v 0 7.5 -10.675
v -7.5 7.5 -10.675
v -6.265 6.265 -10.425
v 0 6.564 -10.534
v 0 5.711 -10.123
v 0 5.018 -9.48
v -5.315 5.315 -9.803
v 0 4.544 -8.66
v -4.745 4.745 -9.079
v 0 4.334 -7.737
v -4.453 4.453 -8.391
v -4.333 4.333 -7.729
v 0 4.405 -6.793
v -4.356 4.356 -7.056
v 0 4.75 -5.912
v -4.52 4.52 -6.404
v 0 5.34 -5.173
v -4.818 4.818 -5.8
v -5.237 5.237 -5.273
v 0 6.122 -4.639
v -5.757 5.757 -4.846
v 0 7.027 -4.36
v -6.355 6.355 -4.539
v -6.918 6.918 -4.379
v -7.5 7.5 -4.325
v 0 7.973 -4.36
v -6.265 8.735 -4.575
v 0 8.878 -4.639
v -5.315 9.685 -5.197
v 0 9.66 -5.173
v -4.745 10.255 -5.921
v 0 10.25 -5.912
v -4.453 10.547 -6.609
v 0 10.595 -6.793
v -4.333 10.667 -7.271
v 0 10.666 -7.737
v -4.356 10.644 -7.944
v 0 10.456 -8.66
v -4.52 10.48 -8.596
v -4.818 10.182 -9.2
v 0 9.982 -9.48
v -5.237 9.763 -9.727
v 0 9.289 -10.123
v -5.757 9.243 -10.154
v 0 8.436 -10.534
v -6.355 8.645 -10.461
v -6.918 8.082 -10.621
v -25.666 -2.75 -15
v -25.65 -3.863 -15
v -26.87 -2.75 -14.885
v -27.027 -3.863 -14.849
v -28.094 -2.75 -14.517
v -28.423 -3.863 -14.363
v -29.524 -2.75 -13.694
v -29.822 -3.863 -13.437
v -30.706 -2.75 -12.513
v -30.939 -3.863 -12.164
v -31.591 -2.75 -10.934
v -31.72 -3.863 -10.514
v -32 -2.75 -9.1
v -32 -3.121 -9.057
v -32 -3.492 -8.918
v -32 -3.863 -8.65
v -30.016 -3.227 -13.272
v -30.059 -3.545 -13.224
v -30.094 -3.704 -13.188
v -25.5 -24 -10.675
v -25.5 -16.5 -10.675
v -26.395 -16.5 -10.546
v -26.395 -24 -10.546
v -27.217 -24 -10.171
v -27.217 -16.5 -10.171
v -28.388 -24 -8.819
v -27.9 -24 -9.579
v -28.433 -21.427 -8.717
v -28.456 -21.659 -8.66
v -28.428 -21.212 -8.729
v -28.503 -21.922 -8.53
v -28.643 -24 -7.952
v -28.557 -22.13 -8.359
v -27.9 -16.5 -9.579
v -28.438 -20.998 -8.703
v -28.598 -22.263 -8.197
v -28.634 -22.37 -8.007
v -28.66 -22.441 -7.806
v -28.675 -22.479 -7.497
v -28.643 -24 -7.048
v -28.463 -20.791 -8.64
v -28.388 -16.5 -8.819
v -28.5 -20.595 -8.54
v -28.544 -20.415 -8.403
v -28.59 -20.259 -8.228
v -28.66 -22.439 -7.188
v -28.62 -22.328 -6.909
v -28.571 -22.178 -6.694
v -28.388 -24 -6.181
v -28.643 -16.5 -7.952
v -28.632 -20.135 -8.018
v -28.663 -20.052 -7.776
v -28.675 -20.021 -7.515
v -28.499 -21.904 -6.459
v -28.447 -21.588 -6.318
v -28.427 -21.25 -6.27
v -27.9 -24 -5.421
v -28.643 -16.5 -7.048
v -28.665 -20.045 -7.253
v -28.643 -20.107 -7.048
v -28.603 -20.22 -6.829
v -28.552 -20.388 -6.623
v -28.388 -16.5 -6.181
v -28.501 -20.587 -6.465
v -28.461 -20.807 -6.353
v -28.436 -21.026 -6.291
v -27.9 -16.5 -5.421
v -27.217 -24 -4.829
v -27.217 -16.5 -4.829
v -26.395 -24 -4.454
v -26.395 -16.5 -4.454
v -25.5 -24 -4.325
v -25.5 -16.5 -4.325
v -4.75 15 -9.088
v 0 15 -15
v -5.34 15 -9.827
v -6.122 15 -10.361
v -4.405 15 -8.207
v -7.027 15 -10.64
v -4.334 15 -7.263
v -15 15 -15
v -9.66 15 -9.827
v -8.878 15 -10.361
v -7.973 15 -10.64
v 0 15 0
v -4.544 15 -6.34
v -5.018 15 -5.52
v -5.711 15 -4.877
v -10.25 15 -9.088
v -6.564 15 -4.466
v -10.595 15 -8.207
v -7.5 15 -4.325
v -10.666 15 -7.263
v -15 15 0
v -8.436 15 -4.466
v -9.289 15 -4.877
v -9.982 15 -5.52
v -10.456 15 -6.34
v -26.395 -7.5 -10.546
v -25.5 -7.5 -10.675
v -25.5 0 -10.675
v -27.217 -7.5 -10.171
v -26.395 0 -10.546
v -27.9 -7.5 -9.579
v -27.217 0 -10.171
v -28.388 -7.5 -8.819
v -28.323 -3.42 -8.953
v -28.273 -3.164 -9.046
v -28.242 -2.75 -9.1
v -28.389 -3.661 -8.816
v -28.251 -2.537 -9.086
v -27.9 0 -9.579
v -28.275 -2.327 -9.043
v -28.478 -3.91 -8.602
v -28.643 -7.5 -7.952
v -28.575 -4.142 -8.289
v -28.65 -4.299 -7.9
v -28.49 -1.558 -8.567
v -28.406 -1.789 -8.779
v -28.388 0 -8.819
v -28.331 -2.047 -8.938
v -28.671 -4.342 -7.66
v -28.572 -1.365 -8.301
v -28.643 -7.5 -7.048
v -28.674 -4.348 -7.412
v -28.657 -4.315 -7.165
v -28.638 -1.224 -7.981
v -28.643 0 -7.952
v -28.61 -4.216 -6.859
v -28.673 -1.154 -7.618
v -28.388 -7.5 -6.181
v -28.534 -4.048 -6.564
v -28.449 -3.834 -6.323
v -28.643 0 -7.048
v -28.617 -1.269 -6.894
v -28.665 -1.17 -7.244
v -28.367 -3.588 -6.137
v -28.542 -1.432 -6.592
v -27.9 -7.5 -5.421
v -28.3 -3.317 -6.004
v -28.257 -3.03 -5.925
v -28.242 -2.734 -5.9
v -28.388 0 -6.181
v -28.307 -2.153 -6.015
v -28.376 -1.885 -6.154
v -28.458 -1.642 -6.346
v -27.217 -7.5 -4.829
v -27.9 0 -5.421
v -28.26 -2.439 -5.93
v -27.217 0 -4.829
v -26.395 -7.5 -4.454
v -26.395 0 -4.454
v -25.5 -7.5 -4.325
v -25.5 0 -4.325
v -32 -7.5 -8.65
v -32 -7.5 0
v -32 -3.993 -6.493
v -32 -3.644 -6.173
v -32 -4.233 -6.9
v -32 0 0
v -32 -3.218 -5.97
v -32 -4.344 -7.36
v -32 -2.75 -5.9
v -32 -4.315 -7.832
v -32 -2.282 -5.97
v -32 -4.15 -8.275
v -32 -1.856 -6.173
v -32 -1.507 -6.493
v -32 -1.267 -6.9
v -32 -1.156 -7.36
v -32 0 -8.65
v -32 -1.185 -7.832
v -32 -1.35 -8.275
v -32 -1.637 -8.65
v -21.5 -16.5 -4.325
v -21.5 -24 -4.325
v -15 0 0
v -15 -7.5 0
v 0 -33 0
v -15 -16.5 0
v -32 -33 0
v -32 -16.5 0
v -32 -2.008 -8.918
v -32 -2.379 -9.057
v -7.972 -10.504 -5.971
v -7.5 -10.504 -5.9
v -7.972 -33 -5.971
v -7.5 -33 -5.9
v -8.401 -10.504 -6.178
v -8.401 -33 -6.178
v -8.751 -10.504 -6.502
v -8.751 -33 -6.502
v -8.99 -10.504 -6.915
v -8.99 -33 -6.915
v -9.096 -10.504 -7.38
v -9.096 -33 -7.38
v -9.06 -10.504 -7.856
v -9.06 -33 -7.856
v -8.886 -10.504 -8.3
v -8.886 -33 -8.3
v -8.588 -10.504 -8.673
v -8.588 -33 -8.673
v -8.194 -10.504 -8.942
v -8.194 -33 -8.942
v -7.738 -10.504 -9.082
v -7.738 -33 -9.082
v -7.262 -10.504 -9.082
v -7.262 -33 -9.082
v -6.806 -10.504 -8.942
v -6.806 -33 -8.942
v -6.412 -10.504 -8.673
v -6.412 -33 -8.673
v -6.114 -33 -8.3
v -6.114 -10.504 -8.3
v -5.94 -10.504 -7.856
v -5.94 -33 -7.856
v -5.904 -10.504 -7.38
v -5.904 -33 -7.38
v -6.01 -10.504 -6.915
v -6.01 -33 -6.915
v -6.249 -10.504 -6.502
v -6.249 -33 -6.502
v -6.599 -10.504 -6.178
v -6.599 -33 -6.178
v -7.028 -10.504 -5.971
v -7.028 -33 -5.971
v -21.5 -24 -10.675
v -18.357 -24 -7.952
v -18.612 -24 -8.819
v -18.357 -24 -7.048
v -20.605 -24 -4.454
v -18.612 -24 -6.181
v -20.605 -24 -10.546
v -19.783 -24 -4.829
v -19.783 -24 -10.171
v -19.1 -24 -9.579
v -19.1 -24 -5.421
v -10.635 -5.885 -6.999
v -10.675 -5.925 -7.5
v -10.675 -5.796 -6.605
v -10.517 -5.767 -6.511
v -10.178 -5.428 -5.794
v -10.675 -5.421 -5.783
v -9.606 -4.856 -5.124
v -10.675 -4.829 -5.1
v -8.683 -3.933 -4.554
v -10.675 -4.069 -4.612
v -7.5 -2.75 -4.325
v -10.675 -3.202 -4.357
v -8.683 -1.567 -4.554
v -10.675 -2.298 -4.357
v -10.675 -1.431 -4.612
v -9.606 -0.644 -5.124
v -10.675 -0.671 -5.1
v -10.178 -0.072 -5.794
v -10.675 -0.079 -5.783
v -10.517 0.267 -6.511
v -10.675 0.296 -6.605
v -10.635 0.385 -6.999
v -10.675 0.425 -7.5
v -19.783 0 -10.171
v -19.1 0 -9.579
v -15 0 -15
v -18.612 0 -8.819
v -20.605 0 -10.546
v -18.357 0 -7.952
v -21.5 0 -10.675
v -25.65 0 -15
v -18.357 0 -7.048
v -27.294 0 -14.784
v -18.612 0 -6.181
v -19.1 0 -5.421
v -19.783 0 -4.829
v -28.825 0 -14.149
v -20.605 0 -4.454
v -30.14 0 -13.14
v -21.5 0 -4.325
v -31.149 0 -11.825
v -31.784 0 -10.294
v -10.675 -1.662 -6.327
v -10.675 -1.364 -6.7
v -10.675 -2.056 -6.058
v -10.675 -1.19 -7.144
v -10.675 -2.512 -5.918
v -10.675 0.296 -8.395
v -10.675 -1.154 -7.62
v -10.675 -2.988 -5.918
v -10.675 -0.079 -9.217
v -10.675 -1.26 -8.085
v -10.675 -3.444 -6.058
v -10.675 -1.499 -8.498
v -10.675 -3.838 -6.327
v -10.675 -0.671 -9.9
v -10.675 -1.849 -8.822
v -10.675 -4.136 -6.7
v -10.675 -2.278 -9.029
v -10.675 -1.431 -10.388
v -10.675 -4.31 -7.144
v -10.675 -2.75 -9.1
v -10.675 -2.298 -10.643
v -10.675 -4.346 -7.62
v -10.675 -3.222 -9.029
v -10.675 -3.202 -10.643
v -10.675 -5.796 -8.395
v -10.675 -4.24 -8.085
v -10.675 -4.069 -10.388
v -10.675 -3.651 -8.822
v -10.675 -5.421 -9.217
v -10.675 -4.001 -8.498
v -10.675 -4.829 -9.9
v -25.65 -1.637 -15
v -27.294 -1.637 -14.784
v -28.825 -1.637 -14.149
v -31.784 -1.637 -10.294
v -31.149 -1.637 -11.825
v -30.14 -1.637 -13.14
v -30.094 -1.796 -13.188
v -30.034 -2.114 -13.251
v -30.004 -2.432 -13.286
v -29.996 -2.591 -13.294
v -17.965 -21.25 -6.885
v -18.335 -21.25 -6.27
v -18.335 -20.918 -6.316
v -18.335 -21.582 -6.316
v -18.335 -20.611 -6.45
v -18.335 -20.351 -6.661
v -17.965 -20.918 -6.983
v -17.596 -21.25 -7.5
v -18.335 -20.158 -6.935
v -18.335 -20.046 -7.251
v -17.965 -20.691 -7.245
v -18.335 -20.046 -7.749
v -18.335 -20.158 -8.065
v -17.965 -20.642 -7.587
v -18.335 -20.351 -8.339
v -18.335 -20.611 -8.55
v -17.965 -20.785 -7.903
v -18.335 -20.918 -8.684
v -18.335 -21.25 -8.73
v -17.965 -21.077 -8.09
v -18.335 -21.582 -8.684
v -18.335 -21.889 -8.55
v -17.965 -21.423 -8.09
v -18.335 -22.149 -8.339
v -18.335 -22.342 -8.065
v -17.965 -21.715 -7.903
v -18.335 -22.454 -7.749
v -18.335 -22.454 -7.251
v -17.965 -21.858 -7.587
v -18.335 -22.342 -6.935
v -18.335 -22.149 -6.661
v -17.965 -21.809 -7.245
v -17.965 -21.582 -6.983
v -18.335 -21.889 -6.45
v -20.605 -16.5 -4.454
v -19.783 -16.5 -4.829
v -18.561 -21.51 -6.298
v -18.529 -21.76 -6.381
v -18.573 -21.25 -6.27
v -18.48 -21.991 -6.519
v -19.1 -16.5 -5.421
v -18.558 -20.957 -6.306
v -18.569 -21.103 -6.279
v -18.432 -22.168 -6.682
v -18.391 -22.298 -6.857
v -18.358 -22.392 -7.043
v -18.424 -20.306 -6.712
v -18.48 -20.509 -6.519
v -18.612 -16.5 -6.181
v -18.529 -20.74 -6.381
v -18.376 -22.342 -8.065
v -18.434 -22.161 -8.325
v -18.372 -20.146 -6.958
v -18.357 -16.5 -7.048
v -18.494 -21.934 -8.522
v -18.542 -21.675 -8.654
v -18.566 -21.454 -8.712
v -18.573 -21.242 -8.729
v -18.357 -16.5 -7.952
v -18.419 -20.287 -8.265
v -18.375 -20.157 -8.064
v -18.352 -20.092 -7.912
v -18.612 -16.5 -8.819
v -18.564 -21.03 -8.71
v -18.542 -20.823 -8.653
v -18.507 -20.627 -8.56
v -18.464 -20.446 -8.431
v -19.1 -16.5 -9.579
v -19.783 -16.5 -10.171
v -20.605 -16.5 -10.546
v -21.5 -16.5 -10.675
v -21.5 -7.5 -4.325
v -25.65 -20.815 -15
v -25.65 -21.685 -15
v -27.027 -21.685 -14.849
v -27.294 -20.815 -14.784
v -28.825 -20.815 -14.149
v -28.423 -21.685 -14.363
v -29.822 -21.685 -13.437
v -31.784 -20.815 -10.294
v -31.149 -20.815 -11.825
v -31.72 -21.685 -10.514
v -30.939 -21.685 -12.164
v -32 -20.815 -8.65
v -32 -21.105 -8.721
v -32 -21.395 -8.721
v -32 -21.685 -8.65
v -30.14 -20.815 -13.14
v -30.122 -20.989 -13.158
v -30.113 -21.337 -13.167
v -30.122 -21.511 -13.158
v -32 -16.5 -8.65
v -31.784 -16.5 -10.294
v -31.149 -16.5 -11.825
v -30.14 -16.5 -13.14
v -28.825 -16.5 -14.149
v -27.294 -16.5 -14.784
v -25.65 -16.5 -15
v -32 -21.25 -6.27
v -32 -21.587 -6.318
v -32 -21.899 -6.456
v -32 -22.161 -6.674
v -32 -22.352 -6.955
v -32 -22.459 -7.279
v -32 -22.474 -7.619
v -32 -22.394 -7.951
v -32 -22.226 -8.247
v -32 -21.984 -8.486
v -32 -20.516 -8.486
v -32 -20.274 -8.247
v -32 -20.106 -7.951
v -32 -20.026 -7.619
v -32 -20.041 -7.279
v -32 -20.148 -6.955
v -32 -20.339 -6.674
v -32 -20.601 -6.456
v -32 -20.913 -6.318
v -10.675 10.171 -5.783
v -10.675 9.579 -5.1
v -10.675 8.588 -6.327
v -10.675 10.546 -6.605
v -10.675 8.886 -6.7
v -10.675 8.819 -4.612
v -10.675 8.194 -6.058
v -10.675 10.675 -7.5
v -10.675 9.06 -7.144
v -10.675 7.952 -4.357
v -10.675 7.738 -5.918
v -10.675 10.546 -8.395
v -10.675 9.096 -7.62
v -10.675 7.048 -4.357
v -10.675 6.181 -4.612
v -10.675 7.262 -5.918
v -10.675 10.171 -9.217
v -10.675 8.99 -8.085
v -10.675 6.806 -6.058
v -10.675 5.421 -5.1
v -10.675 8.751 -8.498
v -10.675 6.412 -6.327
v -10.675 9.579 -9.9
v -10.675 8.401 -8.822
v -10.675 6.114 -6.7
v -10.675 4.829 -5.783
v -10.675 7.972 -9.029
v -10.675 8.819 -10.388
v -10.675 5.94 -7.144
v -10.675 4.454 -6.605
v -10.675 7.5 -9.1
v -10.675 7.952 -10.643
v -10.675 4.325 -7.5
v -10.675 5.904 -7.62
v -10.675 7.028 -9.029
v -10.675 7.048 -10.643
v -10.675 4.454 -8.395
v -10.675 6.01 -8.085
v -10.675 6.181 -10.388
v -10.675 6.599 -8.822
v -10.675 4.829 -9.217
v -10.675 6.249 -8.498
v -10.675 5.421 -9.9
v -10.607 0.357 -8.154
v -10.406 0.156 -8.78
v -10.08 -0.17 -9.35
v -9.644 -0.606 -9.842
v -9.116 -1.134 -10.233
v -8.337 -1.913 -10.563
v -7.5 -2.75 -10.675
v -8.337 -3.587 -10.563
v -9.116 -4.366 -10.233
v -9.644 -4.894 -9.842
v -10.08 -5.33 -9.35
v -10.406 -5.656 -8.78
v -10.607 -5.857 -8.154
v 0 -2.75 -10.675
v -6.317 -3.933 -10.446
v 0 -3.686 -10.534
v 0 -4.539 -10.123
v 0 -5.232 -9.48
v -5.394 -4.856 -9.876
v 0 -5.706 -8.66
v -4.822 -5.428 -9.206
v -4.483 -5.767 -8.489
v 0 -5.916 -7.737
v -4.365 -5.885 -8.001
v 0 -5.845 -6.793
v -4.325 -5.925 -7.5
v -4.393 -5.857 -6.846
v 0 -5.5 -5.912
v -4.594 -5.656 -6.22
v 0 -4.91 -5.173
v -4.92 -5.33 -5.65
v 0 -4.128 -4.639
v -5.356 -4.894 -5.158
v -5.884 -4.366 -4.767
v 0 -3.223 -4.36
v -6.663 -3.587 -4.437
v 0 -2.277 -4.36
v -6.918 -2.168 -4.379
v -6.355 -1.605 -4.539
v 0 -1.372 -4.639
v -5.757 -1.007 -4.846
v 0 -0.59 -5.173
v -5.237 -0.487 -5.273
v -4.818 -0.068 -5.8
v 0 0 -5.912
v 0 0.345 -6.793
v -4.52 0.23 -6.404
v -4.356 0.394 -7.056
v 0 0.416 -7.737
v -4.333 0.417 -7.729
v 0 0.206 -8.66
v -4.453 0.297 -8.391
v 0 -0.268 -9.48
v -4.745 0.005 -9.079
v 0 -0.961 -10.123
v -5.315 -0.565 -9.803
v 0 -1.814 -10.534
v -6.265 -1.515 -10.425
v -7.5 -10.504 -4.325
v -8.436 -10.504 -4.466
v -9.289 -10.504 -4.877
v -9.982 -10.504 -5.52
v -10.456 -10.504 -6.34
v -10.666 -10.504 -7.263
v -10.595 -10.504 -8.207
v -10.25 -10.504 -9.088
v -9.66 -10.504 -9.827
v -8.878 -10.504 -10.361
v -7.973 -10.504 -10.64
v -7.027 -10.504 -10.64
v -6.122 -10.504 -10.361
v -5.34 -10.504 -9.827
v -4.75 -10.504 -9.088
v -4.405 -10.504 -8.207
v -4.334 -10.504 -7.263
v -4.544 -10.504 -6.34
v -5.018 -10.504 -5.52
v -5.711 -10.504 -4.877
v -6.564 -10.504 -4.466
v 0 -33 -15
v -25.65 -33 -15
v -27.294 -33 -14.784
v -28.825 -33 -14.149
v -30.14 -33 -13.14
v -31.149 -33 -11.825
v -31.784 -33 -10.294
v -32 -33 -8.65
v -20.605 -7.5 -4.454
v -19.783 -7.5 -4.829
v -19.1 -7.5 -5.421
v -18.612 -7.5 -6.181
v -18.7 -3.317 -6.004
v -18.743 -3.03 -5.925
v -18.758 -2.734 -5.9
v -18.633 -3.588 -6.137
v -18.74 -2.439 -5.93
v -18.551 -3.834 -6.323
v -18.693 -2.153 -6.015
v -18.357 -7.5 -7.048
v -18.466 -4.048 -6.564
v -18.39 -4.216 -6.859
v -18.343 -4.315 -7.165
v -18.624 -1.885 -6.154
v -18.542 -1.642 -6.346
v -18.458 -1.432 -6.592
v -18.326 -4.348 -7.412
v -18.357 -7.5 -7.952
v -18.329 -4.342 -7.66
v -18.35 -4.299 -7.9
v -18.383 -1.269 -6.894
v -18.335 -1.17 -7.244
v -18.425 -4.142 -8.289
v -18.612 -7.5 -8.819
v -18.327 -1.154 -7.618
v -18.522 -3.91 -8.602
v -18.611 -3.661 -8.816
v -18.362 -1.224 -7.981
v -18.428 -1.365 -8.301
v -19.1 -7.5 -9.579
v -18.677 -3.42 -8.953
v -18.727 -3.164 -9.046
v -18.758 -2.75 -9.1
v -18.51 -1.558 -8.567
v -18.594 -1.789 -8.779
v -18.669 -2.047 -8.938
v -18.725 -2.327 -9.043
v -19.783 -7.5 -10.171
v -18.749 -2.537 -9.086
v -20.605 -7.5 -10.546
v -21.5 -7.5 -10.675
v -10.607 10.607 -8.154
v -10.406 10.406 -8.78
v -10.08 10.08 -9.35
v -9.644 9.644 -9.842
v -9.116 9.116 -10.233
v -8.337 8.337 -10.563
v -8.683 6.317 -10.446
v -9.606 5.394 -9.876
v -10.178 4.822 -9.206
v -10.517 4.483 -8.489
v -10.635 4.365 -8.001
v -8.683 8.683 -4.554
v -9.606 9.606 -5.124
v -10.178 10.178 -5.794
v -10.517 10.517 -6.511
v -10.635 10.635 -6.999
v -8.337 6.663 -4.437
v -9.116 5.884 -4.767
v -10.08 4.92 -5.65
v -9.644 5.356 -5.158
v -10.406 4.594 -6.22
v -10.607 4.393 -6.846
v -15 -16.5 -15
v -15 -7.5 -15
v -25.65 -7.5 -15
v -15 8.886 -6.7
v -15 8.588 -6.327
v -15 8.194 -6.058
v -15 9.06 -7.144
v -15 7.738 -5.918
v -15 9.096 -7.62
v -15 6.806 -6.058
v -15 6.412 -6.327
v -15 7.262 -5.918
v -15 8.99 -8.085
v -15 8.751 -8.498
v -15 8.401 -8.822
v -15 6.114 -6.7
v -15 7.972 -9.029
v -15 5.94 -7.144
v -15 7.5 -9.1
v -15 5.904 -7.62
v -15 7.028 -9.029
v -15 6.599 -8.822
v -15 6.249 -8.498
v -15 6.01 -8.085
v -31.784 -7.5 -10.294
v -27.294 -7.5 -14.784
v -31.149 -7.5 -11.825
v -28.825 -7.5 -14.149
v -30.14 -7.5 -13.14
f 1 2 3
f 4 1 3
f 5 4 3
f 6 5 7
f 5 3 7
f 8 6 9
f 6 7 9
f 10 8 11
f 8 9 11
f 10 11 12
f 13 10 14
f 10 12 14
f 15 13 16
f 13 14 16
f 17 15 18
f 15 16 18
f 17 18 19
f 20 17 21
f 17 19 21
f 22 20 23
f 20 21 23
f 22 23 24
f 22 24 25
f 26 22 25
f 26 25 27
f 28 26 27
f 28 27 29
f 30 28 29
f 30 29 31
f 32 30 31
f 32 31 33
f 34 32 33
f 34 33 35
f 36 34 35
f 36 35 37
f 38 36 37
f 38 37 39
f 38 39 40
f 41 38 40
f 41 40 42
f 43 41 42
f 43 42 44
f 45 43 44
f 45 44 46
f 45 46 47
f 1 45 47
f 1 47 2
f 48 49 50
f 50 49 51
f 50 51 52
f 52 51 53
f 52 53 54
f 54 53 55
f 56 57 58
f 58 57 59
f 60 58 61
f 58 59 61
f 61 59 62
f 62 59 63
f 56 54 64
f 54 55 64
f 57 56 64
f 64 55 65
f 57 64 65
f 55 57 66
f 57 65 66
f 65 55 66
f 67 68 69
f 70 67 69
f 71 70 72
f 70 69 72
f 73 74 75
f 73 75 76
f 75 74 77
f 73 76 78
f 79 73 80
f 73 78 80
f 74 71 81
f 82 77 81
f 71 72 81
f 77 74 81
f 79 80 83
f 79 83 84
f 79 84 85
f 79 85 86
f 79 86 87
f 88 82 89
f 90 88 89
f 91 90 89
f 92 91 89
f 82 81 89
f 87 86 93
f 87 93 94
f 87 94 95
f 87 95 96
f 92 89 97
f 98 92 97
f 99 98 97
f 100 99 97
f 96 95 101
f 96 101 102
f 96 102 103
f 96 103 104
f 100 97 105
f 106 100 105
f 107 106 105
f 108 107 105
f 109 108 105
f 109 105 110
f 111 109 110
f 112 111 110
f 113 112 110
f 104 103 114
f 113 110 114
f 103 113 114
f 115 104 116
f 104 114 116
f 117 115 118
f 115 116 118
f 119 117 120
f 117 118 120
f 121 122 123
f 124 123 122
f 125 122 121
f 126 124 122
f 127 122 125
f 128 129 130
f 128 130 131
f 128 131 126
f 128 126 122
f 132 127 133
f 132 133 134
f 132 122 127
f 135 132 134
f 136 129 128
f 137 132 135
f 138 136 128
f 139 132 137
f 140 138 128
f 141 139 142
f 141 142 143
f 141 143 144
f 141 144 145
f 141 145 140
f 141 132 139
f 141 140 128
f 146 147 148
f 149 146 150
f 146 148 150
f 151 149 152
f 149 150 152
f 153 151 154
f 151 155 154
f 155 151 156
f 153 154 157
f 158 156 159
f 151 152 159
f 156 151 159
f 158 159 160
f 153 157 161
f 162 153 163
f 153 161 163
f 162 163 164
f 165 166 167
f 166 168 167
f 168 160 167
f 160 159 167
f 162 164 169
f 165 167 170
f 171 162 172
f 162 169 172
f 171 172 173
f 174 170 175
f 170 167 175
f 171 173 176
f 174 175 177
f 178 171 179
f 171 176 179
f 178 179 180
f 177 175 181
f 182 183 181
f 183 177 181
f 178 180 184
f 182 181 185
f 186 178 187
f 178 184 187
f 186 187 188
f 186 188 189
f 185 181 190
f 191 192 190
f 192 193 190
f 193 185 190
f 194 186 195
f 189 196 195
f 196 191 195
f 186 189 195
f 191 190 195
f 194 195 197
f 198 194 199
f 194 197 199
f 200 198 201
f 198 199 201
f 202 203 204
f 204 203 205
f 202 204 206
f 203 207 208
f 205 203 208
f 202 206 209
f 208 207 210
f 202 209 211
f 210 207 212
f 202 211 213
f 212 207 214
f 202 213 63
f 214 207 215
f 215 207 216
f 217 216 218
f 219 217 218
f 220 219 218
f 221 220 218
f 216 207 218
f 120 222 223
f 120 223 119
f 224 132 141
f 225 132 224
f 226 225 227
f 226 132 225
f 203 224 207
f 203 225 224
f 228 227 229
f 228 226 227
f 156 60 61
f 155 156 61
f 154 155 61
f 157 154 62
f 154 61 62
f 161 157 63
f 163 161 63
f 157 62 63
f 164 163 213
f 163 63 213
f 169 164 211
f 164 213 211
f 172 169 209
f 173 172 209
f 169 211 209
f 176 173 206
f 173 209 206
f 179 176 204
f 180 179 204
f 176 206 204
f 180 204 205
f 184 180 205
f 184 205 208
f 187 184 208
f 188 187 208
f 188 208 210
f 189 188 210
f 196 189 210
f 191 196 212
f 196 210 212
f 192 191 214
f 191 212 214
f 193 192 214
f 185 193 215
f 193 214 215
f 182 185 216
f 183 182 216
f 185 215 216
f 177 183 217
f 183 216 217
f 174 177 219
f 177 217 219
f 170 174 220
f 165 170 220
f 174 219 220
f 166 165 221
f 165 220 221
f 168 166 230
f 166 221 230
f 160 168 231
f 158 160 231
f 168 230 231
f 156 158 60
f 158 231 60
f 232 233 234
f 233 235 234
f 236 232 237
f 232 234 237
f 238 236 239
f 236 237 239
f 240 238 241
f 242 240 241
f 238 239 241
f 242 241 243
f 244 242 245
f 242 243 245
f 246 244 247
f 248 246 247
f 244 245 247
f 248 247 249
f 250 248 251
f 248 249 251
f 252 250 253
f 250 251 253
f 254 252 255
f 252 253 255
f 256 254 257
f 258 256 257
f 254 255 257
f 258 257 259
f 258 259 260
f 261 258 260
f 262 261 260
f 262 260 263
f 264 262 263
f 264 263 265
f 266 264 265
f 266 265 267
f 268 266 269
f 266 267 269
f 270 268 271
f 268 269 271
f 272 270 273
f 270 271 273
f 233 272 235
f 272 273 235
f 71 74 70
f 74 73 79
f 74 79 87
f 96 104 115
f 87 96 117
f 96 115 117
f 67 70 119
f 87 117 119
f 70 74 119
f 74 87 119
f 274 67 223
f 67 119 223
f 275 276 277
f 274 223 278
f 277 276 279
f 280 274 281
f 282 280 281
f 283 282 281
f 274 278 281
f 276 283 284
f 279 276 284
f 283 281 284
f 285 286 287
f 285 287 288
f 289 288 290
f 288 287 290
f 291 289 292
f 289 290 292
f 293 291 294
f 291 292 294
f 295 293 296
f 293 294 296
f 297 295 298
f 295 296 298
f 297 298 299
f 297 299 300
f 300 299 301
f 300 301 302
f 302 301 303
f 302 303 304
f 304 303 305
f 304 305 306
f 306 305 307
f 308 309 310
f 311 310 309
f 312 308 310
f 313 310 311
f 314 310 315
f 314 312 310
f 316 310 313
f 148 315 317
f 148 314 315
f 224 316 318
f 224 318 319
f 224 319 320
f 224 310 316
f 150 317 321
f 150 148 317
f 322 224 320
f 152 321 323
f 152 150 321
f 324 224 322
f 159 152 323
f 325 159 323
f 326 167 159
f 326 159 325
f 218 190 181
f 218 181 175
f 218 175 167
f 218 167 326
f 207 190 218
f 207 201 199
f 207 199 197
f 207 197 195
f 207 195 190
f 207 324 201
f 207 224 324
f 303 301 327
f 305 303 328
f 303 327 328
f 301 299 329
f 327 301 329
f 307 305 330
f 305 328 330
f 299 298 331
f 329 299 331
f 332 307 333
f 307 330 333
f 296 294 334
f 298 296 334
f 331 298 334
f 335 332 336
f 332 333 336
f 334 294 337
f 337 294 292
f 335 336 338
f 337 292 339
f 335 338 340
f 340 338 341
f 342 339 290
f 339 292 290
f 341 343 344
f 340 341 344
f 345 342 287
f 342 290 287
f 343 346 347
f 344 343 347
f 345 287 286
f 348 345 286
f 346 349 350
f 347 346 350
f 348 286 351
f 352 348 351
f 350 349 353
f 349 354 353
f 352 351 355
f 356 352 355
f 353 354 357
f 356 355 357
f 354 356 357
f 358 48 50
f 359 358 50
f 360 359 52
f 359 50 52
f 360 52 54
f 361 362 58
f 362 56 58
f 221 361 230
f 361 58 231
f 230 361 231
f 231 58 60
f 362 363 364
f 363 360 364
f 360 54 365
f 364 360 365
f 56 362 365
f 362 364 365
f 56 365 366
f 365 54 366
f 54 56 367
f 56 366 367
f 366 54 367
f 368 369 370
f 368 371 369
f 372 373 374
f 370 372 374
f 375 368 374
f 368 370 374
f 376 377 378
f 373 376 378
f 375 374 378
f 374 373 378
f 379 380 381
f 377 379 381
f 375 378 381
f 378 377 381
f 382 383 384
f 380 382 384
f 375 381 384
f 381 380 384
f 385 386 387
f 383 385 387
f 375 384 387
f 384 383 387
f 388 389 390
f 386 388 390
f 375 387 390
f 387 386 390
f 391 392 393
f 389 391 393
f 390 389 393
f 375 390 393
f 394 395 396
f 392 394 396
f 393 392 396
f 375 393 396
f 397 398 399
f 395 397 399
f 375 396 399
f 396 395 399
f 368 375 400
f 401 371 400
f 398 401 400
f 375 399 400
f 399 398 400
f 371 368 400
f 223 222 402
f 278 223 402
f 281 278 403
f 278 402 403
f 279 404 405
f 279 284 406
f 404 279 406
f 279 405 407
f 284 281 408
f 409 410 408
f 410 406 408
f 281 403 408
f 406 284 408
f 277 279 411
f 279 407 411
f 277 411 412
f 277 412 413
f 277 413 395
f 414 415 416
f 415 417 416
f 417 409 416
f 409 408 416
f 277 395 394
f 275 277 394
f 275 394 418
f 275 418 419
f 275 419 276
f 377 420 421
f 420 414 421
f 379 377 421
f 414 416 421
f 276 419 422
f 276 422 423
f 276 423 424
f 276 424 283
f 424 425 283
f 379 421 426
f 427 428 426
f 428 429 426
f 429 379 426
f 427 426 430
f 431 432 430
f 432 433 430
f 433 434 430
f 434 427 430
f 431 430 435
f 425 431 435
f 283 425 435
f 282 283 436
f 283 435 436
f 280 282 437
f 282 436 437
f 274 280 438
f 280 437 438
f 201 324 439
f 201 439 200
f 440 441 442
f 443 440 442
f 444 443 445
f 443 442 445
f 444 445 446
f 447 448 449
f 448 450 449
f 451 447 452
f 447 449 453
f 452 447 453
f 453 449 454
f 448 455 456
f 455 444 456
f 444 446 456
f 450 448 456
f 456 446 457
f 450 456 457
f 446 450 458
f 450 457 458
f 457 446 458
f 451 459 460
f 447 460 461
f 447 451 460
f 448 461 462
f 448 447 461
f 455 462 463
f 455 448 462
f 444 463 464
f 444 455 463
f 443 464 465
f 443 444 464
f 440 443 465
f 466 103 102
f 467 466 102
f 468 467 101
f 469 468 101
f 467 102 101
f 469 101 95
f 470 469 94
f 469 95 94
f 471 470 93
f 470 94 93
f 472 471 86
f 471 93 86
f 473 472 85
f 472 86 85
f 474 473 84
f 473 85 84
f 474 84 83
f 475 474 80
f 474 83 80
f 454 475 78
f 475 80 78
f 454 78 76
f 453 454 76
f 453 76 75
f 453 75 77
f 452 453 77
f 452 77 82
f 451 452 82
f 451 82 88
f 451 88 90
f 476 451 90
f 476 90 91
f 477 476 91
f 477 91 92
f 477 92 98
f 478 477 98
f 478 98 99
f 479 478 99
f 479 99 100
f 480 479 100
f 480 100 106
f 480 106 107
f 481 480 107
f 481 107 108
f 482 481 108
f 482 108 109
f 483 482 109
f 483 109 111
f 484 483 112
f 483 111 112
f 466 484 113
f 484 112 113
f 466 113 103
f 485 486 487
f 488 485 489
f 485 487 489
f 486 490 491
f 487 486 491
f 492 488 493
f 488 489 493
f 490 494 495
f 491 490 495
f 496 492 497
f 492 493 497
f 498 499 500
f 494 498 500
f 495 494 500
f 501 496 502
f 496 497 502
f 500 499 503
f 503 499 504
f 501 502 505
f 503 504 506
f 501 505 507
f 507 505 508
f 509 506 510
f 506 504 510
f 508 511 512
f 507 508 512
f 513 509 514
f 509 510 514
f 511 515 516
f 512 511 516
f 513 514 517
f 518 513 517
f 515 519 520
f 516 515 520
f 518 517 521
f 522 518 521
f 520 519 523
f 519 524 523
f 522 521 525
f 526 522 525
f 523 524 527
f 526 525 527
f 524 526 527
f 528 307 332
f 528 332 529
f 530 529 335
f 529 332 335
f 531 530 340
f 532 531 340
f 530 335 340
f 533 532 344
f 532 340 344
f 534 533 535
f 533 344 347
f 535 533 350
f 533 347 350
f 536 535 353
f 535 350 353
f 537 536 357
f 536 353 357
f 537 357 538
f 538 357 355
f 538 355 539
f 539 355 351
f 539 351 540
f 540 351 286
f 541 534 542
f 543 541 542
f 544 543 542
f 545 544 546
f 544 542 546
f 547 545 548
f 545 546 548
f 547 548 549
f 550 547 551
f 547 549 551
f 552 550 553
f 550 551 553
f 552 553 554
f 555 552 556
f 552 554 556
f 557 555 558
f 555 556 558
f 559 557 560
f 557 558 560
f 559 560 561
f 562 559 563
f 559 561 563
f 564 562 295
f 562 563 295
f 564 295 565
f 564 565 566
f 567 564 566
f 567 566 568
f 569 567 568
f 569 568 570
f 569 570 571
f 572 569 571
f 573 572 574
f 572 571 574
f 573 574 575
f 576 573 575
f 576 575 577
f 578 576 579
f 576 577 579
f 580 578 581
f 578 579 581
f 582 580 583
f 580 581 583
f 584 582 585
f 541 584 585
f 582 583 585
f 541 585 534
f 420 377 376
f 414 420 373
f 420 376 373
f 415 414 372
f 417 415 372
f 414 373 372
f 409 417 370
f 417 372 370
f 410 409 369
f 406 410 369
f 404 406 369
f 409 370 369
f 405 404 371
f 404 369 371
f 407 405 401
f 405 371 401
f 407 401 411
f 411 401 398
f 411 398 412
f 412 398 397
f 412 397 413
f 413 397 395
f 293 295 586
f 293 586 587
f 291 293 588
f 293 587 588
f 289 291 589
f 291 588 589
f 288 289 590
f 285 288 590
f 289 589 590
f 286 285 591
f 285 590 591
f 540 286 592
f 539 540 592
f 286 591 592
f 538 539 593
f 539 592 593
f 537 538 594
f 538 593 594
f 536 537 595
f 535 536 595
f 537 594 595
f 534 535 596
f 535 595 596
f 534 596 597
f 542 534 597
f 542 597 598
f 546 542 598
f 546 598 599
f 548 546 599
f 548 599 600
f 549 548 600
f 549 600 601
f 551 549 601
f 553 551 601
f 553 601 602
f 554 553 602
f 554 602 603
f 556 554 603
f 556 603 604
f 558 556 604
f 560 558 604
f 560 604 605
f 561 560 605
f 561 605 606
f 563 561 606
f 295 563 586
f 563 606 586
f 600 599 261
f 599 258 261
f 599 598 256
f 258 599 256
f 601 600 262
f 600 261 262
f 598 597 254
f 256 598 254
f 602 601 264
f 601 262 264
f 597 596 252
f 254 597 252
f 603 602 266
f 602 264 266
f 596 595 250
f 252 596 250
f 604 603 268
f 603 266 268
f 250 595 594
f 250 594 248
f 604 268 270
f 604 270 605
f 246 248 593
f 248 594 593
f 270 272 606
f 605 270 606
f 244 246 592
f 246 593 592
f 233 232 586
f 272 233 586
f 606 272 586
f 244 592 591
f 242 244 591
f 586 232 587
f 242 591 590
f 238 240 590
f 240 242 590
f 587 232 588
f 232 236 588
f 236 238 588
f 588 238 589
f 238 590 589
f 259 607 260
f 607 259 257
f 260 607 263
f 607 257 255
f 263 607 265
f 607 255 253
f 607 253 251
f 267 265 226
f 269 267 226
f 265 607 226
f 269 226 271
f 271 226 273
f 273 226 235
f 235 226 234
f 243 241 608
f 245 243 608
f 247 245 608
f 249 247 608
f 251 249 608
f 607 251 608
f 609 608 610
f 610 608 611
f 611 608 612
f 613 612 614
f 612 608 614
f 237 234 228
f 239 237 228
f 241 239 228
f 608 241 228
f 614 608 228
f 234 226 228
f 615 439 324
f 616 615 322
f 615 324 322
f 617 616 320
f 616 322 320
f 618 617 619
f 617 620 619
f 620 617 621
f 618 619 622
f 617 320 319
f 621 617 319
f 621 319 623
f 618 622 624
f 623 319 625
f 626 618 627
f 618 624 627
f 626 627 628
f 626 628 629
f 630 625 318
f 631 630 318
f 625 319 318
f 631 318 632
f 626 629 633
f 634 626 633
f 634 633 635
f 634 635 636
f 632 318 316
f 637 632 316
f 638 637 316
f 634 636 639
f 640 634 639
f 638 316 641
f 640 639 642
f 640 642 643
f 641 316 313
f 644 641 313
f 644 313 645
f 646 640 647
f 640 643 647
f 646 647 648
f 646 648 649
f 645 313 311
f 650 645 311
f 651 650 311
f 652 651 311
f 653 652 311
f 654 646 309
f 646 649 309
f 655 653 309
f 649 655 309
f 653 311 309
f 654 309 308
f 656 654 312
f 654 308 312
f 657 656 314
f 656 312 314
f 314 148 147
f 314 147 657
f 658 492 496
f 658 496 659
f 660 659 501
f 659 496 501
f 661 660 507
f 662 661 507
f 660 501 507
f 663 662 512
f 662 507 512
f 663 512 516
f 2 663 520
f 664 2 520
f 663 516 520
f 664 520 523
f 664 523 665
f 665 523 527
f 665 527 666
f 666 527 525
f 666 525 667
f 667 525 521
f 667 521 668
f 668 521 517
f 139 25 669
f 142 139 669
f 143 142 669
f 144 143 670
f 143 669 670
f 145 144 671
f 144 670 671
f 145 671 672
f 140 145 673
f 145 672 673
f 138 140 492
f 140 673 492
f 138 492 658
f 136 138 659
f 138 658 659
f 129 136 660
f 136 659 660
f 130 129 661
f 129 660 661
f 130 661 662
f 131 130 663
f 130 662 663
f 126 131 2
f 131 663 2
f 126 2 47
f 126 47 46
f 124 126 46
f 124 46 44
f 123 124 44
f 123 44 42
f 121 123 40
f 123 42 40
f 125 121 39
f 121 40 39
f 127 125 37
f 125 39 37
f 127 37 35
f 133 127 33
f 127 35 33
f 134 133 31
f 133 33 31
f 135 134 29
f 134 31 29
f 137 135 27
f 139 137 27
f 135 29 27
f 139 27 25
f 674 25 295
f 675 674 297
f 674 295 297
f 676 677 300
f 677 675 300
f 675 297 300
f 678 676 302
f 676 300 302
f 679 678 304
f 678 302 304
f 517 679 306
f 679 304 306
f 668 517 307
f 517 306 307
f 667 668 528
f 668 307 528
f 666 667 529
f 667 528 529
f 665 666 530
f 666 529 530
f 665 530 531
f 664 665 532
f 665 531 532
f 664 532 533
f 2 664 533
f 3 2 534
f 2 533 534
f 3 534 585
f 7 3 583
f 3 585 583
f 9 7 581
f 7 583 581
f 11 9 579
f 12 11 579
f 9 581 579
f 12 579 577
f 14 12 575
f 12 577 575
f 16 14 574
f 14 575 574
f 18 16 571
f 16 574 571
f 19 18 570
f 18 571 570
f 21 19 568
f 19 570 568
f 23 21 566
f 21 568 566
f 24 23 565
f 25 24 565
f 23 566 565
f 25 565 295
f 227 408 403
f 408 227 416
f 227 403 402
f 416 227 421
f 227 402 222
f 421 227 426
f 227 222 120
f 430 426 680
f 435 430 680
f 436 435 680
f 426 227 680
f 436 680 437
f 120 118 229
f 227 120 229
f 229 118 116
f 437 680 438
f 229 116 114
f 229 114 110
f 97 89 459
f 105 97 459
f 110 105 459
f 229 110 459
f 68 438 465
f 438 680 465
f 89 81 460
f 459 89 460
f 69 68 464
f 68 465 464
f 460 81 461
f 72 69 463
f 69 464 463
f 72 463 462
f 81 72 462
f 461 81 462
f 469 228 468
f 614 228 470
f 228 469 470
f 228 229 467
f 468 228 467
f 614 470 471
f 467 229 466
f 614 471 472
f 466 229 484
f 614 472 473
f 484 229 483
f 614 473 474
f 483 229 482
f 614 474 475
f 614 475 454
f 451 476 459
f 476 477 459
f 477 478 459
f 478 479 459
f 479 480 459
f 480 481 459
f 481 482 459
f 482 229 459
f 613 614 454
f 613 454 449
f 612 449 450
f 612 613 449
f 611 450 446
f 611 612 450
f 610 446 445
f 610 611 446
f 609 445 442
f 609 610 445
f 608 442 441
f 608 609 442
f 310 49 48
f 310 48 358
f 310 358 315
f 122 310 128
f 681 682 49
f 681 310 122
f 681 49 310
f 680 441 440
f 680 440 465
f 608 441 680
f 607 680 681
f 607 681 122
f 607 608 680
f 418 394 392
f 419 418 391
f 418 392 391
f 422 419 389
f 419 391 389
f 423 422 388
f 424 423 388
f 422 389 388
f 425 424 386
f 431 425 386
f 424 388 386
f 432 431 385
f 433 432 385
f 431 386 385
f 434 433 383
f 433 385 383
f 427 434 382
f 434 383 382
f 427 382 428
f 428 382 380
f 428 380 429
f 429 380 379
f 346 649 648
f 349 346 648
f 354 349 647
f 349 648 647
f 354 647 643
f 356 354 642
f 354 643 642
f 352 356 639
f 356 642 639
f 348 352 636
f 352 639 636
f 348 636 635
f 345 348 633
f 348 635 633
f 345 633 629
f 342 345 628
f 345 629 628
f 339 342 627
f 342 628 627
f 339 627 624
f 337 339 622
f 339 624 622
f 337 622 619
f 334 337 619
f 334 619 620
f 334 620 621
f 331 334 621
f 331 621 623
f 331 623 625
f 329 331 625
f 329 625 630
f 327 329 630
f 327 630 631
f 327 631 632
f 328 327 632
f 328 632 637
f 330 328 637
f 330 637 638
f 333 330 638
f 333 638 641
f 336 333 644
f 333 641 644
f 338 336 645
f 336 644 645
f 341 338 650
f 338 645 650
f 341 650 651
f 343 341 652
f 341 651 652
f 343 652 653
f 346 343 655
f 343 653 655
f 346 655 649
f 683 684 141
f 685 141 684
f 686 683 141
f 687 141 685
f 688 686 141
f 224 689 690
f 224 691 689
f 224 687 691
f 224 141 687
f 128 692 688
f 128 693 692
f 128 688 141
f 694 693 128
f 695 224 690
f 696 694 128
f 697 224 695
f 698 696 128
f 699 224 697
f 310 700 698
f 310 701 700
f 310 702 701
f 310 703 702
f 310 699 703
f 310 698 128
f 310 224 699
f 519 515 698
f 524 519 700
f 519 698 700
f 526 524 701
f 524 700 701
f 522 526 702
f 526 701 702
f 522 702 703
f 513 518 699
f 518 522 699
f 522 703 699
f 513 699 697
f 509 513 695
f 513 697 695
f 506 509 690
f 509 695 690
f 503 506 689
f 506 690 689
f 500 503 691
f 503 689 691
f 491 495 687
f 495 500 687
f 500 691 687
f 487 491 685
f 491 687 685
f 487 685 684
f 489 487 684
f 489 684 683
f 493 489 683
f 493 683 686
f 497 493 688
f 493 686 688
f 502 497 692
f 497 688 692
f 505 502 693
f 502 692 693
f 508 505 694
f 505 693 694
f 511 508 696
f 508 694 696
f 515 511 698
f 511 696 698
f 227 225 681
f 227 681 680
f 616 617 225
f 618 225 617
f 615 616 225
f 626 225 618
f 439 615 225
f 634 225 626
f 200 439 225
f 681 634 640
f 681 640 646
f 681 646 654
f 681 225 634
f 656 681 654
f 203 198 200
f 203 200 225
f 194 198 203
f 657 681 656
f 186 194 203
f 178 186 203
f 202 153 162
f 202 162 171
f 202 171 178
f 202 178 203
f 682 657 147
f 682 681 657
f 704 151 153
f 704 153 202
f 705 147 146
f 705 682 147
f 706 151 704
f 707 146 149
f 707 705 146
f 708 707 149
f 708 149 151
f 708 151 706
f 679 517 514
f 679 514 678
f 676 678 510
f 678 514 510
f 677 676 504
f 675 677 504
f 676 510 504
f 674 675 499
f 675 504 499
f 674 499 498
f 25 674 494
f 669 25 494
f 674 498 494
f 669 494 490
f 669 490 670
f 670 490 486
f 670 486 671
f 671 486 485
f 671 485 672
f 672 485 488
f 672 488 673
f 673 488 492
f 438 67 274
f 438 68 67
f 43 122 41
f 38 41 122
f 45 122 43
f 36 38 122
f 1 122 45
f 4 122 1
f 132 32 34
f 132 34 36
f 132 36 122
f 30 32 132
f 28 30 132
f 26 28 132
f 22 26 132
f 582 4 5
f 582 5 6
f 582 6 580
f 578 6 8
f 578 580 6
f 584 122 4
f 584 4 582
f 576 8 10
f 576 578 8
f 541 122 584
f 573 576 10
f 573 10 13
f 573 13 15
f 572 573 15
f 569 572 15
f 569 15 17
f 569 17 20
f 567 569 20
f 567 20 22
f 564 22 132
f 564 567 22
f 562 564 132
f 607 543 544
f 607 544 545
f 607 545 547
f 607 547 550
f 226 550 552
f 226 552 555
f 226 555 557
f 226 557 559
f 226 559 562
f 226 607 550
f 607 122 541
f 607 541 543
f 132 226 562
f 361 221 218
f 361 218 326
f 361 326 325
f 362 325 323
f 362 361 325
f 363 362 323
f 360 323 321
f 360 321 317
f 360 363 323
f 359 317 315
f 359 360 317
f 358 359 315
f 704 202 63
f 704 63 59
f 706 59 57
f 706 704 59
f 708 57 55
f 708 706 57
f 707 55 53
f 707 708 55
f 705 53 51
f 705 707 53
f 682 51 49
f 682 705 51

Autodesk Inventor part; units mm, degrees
ref_plane "YZ Plane" through (0, 0, 0) normal (1, 0, 0) x (0, 1, 0)
ref_plane "XZ Plane" through (0, 0, 0) normal (0, 1, 0) x (-1, 0, 0)
ref_plane "XY Plane" through (0, 0, 0) normal (0, 0, 1) x (1, 0, 0)
sketch "Base Profile" plane through (0, 0, 0) normal (0, 1, 0) x (-1, 0, 0)
  line L0 (0, 0) -> (15, 0)
  line L1 (15, 0) -> (15, -15)
  line L2 (15, -15) -> (0, -15)
  line L3 (0, -15) -> (0, 0)
  line L4 (15, 0) -> (32, 0)
  line L5 (32, 0) -> (32, -15)
  line L6 (32, -15) -> (15, -15)
  line L7 (15, -15) -> (15, 0)
  dimension "d164" = 15
  dimension "d165" = 15
  dimension "d166" = 17
  dimension "d167" = 15
extrude "Stock" add sketch "Base Profile" against normal blind 33
extrude "Extrusion Post" add sketch "Base Profile" along normal blind 15 contours L0 L1 L2 L3
sketch "Side Profile" plane through (0, -33, -15) normal (0, 0, -1) x (-1, 0, 0)
  line L0 (0, 0) -> (0, 48) projected
  line L1 (32, 0) -> (0, 0) projected
  line L2 (32, 33) -> (32, 0) projected
  line L3 (15, 33) -> (32, 33) projected
  line L4 (15, 33) -> (15, 48) projected
  line L5 (0, 48) -> (15, 48) projected
  line L6 (0, 16.5) -> (32, 16.5)
  line L7 (0, 25.5) -> (32, 25.5)
  line L8 (15, 33) -> (15, 0)
  point P0 (15, 16.5)
  point P1 (15, 25.5)
  dimension "d354" = 7.5
  dimension "d355" = 16.5
extrude "Lower Half Cut" cut sketch "Side Profile" against normal through all contours L8 L7 L2 L6
sketch "Bottom Profile" plane through (-35, 0, -15) normal (0, -1, 0) x (1, 0, 0)
  line L0 (13.5, 7.5) -> (9.5, 7.5) construction
  line L1 (13.5, 10.675) -> (9.5, 10.675)
  line L2 (9.5, 4.325) -> (13.5, 4.325)
  arc A0 (13.5, 4.325) -> (13.5, 10.675) centre (13.5, 7.5) ccw
  arc A1 (9.5, 10.675) -> (9.5, 4.325) centre (9.5, 7.5) ccw
  line L3 (3, 15) -> (3, 0) projected
  line L4 (35, 15) -> (3, 15) projected
  point P0 (11.5, 7.5)
  dimension "d291" = 4
  dimension "d292" = 6.35
  dimension "d293" = 6.5
  dimension "d294" = 7.5
extrude "Slot Cut" cut sketch "Bottom Profile" along normal blind 24
sketch "Front Hole Pattern" plane through (0, -33, 0) normal (1, 0, 0) x (0, 0, -1)
  line L0 (0, 0) -> (0, 48) projected
  circle A0 centre (7.5, 40.5) radius 3.175
  line L1 (0, 48) -> (15, 48) projected
  circle A1 centre (7.5, 30.25) radius 3.175
  dimension "d317" = 6.35
  dimension "d318" = 7.5
  dimension "d319" = 7.5
  dimension "d368" = 17.75
hole "Front Mounting Hole" at (0, 7.5, -7.5) direction (-1, 0, 0) diameter 3.2004 end through all counterbore diameter 6.35 counterbore depth 10.675 clearance for "Socket Head Cap Screw" size "M3" standard "Ansi Metric M Profile"
sketch "Sketch33" plane through (0, 15, 0) normal (0, 1, 0) x (1, 0, 0)
  line L0 (-15, 15) -> (-15, 0) projected
  line L1 (-15, 0) -> (0, 0) projected
  line L2 (0, 0) -> (0, 15) projected
  line L3 (0, 15) -> (-15, 15) projected
  circle A0 centre (-7.5, 7.5) radius 3.175
  dimension "d340" = 6.35
  dimension "d341" = 7.5
  dimension "d342" = 7.5
hole "Top Mounting Hole" at (-7.5, 15, -7.5) direction (0, -1, 0) diameter 3.2004 end through all counterbore diameter 6.35 counterbore depth 25.5044 clearance for "Socket Head Cap Screw" size "M3" standard "Ansi Metric M Profile"
hole "Front Adjustment Hole" at (0, -2.75, -7.5) direction (-1, 0, 0) diameter 3.2004 end through all counterbore diameter 6.35 counterbore depth 10.675 clearance for "Socket Head Cap Screw" size "M3" standard "Ansi Metric M Profile"
sketch "Rear Hole Patttern" plane through (-32, -33, -15) normal (-1, 0, 0) x (0, 0, 1)
  line L0 (0, 25.5) -> (15, 25.5) construction
  line L1 (15, 33) -> (15, 25.5) construction
  line L2 (0, 33) -> (15, 33) construction
  line L3 (0, 33) -> (0, 25.5) construction
  line L4 (15, 16.5) -> (0, 16.5) construction
  line L5 (0, 16.5) -> (0, 0) construction
  line L6 (15, 0) -> (0, 0) construction
  line L7 (15, 16.5) -> (15, 0) construction
  circle A0 centre (7.5, 30.25) radius 1.5
  circle A1 centre (7.5, 11.75) radius 1.5
  line L8 (0, 27.5) -> (15, 27.5) construction
  line L9 (0, 16.5) -> (0, 0) projected
  line L10 (0, 14.5) -> (15, 14.5) construction
  dimension "d357" = 3
  dimension "d358" = 7.5
  dimension "d360" = 3
  dimension "d362" = 7.5
  dimension "d364" = 2
  dimension "d365" = 2
  dimension "d366" = 2.75
  dimension "d367" = 2.75
hole "Rear Holes" at (-32, -21.25, -7.5) direction (1, 0, 0) diameter 2.459 depth 13.6652 tip angle 118 thread size "M3x0.5" class "6H" standard "ANSI Metric M Profile"
fillet "Fillet" radius 6.35 2 edges at (-32, -3.75, -15) (-32, -24.75, -15)
equation "\"d164\" = extrusionWidth"
equation "\"d165\" = extrusionWidth"
equation "\"d166\" = idlerLength"
equation "\"d167\" = d165"
equation "\"d168\" = extrusionOffset"
equation "\"extrusionWidth\" = 15"
equation "\"idlerLength\" = 17"
equation "\"bearingOffsetFromBottom\" = 7.5"
equation "\"extrusionOffset\" = 33"
equation "\"bearingStackHeight\" = 9"
equation "\"bearingSlotLength\" = 4"
equation "\"bearingClearance\" = 13"
equation "\"pinSupportLength\" = 2"
properties part number "B Idler (Tulip)" material "Aluminum 6061"
